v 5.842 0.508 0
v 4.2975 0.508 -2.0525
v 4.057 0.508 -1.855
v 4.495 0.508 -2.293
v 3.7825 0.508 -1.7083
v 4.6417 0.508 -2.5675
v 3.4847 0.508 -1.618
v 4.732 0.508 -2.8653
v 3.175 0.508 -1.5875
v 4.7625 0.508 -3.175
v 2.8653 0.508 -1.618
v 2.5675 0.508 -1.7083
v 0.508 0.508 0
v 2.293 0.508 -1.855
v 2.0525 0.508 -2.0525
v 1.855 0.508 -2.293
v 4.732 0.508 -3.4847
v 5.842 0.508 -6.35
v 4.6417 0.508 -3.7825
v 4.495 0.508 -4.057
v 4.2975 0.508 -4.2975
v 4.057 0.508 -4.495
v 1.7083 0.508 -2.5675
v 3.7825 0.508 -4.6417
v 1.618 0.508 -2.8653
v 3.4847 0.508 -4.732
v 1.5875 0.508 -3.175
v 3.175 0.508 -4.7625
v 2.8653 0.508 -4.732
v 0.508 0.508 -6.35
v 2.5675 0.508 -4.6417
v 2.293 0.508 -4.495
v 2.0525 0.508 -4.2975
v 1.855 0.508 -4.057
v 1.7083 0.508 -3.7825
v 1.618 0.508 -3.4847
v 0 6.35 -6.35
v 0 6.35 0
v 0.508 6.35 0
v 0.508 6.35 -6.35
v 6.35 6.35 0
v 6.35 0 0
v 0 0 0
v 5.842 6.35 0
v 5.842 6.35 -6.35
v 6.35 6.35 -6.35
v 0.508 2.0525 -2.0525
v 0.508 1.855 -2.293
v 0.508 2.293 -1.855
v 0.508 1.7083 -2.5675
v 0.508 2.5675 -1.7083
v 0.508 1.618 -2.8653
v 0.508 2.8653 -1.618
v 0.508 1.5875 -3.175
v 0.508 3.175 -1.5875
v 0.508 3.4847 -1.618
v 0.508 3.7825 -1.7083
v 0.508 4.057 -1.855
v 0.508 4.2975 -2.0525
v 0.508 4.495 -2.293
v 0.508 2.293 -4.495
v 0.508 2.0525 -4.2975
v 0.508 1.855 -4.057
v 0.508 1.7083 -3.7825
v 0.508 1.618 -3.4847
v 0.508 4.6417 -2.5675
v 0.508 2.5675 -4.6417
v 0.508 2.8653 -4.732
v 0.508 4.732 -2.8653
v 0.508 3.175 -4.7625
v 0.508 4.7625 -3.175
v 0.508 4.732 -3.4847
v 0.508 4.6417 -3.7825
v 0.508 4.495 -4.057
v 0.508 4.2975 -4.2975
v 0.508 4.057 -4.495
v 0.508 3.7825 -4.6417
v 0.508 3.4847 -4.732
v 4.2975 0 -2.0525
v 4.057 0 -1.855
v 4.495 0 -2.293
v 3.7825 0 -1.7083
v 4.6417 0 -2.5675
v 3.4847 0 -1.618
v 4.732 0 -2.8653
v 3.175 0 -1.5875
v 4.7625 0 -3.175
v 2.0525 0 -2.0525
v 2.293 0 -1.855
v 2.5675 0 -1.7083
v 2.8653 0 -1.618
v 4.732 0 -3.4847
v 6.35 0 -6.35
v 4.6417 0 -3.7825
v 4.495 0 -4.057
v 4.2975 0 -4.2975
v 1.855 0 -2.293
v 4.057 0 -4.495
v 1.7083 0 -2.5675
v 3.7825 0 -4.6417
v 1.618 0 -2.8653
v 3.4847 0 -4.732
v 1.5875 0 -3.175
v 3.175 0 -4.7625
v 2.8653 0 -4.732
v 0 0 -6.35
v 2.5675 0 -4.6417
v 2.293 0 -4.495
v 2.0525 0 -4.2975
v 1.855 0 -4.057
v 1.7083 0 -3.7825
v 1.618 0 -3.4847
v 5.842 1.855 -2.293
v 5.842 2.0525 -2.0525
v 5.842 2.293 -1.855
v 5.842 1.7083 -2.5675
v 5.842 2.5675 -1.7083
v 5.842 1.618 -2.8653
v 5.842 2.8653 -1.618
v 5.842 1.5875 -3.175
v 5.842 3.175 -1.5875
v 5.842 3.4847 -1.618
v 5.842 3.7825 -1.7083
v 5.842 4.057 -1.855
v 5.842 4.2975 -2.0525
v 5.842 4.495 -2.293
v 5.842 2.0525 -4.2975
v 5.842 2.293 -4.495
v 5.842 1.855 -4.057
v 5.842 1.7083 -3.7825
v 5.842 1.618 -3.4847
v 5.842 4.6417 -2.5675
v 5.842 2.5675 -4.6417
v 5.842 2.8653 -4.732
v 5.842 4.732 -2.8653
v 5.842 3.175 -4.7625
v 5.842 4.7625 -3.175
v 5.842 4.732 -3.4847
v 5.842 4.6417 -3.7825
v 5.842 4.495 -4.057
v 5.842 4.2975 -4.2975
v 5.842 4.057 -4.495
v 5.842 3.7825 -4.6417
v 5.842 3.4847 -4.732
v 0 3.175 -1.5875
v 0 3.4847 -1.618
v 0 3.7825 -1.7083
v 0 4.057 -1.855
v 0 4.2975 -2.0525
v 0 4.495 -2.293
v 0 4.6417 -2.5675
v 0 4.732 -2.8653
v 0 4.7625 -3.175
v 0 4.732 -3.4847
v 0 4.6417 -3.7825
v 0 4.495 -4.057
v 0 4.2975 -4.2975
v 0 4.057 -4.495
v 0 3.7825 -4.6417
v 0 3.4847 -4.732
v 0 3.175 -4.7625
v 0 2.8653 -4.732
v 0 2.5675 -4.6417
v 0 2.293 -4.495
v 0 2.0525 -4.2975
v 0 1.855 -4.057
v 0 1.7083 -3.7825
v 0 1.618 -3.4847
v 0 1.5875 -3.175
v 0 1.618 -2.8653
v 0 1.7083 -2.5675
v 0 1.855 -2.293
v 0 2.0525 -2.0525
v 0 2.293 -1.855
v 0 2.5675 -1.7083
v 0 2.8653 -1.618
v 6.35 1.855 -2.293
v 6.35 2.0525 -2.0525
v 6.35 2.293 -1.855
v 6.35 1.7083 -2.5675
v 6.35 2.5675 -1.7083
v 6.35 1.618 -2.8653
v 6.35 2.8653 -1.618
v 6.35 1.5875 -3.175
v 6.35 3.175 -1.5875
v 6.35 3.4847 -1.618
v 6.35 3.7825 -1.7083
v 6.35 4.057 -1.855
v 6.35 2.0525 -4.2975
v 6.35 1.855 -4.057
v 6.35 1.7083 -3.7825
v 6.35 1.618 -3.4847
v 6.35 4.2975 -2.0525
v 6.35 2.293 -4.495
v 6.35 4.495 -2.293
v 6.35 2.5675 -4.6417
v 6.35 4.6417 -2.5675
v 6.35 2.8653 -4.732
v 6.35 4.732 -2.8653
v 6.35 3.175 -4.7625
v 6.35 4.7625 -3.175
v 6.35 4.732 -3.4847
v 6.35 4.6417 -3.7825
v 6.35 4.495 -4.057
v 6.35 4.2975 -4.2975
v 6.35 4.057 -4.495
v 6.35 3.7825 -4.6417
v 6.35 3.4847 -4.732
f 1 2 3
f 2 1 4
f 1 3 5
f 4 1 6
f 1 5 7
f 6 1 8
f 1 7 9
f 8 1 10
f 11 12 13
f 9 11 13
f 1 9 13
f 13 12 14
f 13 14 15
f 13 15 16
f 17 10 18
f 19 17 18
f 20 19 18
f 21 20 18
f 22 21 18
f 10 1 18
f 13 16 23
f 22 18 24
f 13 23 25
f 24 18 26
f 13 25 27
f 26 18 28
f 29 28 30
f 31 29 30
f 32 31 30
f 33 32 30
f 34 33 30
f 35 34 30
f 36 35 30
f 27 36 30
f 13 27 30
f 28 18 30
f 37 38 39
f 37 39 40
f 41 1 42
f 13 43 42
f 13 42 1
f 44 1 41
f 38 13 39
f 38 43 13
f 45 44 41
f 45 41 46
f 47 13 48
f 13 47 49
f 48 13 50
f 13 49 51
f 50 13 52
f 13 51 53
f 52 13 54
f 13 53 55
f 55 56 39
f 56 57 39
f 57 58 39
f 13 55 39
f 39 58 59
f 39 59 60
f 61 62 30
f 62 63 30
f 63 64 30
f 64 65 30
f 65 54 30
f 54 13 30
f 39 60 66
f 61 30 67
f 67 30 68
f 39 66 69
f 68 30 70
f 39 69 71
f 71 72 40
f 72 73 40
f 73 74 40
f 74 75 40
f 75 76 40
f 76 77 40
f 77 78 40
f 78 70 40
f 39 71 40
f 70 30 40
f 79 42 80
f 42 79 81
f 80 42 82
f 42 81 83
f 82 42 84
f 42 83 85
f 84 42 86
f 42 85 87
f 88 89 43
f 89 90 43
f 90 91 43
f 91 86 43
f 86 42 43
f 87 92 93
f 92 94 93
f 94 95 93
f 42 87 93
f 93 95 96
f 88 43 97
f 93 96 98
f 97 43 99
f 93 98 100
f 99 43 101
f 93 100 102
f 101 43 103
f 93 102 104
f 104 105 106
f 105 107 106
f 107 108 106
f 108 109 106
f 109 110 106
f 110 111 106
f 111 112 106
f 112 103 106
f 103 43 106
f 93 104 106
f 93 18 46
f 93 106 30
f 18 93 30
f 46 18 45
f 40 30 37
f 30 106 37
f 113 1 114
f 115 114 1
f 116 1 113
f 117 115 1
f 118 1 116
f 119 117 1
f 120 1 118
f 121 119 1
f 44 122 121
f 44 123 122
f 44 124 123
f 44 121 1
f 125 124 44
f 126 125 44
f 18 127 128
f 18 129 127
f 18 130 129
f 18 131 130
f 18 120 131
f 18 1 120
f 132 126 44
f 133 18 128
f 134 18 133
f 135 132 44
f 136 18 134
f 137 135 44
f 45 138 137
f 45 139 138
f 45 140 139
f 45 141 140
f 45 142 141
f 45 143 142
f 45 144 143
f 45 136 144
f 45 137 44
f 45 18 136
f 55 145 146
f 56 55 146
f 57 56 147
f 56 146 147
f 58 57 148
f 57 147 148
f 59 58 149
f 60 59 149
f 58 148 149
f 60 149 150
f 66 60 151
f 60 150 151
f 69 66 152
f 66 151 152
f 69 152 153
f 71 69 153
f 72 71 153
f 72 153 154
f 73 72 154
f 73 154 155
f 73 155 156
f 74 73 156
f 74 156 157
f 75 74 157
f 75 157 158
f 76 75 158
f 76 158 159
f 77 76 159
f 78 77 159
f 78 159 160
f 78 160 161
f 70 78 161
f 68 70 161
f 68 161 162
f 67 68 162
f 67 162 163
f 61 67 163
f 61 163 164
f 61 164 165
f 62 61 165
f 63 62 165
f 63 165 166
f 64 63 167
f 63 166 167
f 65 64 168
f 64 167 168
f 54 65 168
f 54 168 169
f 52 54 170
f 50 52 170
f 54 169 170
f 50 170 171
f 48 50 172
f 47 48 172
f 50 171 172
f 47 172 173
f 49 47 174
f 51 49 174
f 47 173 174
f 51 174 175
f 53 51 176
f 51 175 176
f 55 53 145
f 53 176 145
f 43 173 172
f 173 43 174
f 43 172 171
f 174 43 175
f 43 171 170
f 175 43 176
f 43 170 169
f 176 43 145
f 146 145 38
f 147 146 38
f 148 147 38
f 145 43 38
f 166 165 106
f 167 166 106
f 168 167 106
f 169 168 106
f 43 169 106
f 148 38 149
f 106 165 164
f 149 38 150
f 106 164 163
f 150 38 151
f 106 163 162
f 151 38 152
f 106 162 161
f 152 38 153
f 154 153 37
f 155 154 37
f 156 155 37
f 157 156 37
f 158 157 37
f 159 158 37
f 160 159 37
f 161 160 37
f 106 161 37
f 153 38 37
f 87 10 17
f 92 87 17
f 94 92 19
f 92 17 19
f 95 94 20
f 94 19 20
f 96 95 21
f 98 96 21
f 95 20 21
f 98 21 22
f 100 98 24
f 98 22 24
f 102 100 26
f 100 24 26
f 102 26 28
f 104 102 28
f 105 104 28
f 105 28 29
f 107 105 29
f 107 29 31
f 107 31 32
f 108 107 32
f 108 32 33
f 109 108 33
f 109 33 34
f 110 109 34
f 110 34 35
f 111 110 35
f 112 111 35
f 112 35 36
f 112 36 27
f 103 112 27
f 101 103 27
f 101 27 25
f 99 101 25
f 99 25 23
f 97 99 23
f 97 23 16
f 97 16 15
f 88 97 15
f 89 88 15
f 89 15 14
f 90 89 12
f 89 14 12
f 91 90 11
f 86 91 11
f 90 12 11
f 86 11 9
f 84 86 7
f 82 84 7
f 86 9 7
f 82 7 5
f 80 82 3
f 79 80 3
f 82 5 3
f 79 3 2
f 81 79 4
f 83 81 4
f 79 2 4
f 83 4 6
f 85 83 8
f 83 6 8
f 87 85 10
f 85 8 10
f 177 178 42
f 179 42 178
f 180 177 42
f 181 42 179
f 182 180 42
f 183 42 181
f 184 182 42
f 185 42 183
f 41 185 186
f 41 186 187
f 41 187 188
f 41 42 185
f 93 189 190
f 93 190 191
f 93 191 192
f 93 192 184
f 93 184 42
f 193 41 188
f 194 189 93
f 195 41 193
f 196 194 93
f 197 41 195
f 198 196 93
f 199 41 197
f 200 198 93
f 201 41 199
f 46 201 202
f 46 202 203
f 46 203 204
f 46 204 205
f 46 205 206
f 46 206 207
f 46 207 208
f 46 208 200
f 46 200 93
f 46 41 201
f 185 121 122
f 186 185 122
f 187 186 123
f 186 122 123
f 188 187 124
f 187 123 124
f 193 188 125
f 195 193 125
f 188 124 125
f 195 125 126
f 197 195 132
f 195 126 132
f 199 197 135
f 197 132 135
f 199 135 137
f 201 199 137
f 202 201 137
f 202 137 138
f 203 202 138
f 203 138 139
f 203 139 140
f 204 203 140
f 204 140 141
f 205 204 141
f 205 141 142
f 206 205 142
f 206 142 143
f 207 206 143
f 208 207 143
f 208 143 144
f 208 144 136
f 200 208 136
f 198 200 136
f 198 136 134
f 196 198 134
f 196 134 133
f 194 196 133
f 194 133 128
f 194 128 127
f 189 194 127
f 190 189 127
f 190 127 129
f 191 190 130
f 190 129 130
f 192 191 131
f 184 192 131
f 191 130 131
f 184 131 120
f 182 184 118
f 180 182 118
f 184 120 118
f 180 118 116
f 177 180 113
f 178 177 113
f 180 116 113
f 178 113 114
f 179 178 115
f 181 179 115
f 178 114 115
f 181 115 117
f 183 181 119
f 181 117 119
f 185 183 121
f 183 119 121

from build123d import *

# Parameters (mm, degrees)
SKETCH1_W                        = 6.35
SKETCH1_H                        = 6.35
BOSS_EXTRUDE1_DEPTH              = 6.35
F_1_8_0_125_DIAMETER_HOLE1_D     = 3.175
F_1_8_0_125_DIAMETER_HOLE1_DEPTH = 70.104
F_1_8_0_125_DIAMETER_HOLE1_TIP   = 0.953866233
SKETCH4_W                        = 5.334
SKETCH4_H                        = 5.842
CUT_EXTRUDE1_DEPTH               = 11.998522628
F_1_8_0_125_DIAMETER_HOLE2_D     = 3.175
F_1_8_0_125_DIAMETER_HOLE2_DEPTH = 70.104
F_1_8_0_125_DIAMETER_HOLE2_TIP   = 0.953866233


with BuildPart() as part:
    # Sketch1 → Boss-Extrude1 (new body)
    with BuildSketch(Plane(origin=(0, 0, 0), x_dir=(0, 0, -1), z_dir=(1, 0, 0))):
        with Locations((3.175, 3.175)):
            Rectangle(SKETCH1_W, SKETCH1_H)
    extrude(amount=BOSS_EXTRUDE1_DEPTH)

    # 1/8 (0.125) Diameter Hole1
    with Locations(Plane(origin=(6.35, 0, 0), x_dir=(0, 0, -1), z_dir=(1, 0, 0))):
        with Locations((3.175, 3.175)):
            Hole(F_1_8_0_125_DIAMETER_HOLE1_D / 2, depth=F_1_8_0_125_DIAMETER_HOLE1_DEPTH)
            with Locations((0, 0, -(F_1_8_0_125_DIAMETER_HOLE1_DEPTH + F_1_8_0_125_DIAMETER_HOLE1_TIP / 2))):  # 118° drill point
                Cone(0, F_1_8_0_125_DIAMETER_HOLE1_D / 2, F_1_8_0_125_DIAMETER_HOLE1_TIP, mode=Mode.SUBTRACT)

    # Sketch4 → Cut-Extrude1 (cut, through all)
    with BuildSketch(Plane(origin=(0, 0, -6.35), x_dir=(-1, 0, 0), z_dir=(0, 0, -1))):
        with Locations((-3.175, 3.429)):
            Rectangle(SKETCH4_W, SKETCH4_H)
    extrude(amount=-CUT_EXTRUDE1_DEPTH, mode=Mode.SUBTRACT)

    # 1/8 (0.125) Diameter Hole2
    with Locations(Plane(origin=(0, 0, 0), x_dir=(-1, 0, 0), z_dir=(0, -1, 0))):
        with Locations((-3.175, 3.175)):
            Hole(F_1_8_0_125_DIAMETER_HOLE2_D / 2, depth=F_1_8_0_125_DIAMETER_HOLE2_DEPTH)
            with Locations((0, 0, -(F_1_8_0_125_DIAMETER_HOLE2_DEPTH + F_1_8_0_125_DIAMETER_HOLE2_TIP / 2))):  # 118° drill point
                Cone(0, F_1_8_0_125_DIAMETER_HOLE2_D / 2, F_1_8_0_125_DIAMETER_HOLE2_TIP, mode=Mode.SUBTRACT)


solid = part.part
